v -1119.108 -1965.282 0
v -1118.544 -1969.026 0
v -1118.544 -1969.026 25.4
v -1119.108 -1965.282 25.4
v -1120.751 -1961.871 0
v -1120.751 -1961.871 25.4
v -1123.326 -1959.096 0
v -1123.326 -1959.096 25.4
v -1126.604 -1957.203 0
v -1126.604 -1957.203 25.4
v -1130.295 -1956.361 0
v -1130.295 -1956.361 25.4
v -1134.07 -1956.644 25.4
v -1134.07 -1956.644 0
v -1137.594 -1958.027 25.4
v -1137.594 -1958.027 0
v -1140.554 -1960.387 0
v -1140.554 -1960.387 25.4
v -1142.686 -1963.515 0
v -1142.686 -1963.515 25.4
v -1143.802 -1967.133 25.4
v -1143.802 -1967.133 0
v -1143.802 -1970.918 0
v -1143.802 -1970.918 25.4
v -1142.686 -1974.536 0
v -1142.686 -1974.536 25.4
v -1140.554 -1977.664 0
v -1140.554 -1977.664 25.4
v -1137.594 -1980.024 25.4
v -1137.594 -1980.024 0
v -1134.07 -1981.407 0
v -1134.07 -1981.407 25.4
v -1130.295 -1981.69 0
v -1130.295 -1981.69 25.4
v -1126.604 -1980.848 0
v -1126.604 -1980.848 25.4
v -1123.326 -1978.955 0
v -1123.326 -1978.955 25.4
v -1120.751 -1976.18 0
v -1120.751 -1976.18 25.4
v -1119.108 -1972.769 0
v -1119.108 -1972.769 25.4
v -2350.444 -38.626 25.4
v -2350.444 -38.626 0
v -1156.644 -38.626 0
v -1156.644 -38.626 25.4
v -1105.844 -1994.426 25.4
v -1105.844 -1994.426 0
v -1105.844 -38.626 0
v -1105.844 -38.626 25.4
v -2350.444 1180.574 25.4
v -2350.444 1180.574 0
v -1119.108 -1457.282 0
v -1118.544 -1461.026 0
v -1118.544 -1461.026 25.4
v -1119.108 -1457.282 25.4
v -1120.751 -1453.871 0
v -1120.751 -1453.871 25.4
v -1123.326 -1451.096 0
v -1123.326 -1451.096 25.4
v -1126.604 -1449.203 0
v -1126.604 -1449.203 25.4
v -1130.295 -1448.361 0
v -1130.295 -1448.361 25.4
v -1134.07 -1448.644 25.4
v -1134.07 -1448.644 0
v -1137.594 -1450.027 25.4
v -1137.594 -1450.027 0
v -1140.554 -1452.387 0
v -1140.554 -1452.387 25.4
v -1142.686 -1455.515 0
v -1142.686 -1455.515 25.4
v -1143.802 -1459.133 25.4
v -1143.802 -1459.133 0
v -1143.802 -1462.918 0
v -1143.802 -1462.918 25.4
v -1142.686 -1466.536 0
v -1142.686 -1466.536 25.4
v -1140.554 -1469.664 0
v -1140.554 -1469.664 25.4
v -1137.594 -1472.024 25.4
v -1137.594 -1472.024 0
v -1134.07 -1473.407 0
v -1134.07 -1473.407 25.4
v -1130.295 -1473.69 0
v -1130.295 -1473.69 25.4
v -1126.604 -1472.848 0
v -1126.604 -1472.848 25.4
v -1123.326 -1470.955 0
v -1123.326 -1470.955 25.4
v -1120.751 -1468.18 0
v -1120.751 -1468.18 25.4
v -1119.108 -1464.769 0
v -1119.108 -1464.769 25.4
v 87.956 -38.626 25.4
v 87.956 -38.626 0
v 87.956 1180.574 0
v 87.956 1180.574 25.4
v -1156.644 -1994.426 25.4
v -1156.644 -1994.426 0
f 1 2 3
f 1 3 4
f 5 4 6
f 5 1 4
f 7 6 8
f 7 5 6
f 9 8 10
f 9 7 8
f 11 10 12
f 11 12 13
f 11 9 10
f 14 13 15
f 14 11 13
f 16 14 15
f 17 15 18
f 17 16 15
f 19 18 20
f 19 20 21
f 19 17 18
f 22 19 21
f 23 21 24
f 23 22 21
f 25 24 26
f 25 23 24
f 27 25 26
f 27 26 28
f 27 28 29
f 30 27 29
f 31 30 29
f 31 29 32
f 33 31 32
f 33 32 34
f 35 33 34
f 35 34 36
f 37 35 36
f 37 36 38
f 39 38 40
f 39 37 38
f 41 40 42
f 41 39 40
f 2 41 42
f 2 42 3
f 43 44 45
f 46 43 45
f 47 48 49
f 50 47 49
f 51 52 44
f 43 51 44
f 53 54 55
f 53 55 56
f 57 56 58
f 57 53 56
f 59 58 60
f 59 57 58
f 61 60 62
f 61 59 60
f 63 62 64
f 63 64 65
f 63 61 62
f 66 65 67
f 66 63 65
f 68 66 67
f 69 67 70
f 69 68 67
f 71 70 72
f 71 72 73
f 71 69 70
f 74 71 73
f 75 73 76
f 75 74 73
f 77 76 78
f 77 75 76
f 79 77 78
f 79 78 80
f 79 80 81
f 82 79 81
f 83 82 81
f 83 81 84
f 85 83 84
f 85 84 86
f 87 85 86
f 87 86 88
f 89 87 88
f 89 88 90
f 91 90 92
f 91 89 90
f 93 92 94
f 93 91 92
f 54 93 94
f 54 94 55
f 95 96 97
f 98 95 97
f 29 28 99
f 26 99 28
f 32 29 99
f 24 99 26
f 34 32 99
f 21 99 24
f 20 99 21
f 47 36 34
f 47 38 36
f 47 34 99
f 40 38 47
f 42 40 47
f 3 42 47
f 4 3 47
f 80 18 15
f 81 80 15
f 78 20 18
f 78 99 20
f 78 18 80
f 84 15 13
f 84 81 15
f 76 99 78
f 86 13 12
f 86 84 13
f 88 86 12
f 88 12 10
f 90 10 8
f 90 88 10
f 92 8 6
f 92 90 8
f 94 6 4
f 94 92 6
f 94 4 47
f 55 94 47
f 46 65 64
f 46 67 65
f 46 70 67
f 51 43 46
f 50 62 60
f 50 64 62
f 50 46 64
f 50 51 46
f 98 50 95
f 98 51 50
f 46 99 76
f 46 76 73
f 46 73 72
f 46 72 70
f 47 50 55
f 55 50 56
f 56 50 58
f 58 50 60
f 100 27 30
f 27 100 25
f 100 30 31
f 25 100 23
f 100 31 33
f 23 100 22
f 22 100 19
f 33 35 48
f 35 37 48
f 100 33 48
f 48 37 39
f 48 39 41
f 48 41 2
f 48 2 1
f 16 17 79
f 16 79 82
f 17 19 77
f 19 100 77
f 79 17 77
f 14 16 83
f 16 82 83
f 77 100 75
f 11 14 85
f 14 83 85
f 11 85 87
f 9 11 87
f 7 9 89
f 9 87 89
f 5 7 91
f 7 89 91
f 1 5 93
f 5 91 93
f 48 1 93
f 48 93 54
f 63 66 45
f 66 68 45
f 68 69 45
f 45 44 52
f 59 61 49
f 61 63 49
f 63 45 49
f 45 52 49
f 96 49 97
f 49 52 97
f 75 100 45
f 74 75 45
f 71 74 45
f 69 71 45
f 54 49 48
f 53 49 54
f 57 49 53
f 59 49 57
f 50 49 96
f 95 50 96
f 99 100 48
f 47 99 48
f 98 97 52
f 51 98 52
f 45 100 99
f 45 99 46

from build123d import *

# Parameters (mm, degrees)
F0_W     = 50.8
F0_H     = 1955.8
F0_R     = 12.7
F1_DEPTH = 25.4


with BuildPart() as f1:
    # F0 (on Top) → F1 (new body)
    with BuildSketch(Plane.XY):
        Polygon((87.955825, 1180.574484), (-2350.444175, 1180.574484), (-2350.444175, -38.625516), (-1156.644175, -38.625516), (-1105.844175, -38.625516), (87.955825, -38.625516), align=None)
        with Locations((-1131.244175, -1016.525516)):
            Rectangle(F0_W, F0_H)
        with Locations((-1131.244175, -1969.025516)):
            Circle(F0_R, mode=Mode.SUBTRACT)
        with Locations((-1131.244175, -1461.025516)):
            Circle(F0_R, mode=Mode.SUBTRACT)
    extrude(amount=F1_DEPTH)


solid = f1.part
